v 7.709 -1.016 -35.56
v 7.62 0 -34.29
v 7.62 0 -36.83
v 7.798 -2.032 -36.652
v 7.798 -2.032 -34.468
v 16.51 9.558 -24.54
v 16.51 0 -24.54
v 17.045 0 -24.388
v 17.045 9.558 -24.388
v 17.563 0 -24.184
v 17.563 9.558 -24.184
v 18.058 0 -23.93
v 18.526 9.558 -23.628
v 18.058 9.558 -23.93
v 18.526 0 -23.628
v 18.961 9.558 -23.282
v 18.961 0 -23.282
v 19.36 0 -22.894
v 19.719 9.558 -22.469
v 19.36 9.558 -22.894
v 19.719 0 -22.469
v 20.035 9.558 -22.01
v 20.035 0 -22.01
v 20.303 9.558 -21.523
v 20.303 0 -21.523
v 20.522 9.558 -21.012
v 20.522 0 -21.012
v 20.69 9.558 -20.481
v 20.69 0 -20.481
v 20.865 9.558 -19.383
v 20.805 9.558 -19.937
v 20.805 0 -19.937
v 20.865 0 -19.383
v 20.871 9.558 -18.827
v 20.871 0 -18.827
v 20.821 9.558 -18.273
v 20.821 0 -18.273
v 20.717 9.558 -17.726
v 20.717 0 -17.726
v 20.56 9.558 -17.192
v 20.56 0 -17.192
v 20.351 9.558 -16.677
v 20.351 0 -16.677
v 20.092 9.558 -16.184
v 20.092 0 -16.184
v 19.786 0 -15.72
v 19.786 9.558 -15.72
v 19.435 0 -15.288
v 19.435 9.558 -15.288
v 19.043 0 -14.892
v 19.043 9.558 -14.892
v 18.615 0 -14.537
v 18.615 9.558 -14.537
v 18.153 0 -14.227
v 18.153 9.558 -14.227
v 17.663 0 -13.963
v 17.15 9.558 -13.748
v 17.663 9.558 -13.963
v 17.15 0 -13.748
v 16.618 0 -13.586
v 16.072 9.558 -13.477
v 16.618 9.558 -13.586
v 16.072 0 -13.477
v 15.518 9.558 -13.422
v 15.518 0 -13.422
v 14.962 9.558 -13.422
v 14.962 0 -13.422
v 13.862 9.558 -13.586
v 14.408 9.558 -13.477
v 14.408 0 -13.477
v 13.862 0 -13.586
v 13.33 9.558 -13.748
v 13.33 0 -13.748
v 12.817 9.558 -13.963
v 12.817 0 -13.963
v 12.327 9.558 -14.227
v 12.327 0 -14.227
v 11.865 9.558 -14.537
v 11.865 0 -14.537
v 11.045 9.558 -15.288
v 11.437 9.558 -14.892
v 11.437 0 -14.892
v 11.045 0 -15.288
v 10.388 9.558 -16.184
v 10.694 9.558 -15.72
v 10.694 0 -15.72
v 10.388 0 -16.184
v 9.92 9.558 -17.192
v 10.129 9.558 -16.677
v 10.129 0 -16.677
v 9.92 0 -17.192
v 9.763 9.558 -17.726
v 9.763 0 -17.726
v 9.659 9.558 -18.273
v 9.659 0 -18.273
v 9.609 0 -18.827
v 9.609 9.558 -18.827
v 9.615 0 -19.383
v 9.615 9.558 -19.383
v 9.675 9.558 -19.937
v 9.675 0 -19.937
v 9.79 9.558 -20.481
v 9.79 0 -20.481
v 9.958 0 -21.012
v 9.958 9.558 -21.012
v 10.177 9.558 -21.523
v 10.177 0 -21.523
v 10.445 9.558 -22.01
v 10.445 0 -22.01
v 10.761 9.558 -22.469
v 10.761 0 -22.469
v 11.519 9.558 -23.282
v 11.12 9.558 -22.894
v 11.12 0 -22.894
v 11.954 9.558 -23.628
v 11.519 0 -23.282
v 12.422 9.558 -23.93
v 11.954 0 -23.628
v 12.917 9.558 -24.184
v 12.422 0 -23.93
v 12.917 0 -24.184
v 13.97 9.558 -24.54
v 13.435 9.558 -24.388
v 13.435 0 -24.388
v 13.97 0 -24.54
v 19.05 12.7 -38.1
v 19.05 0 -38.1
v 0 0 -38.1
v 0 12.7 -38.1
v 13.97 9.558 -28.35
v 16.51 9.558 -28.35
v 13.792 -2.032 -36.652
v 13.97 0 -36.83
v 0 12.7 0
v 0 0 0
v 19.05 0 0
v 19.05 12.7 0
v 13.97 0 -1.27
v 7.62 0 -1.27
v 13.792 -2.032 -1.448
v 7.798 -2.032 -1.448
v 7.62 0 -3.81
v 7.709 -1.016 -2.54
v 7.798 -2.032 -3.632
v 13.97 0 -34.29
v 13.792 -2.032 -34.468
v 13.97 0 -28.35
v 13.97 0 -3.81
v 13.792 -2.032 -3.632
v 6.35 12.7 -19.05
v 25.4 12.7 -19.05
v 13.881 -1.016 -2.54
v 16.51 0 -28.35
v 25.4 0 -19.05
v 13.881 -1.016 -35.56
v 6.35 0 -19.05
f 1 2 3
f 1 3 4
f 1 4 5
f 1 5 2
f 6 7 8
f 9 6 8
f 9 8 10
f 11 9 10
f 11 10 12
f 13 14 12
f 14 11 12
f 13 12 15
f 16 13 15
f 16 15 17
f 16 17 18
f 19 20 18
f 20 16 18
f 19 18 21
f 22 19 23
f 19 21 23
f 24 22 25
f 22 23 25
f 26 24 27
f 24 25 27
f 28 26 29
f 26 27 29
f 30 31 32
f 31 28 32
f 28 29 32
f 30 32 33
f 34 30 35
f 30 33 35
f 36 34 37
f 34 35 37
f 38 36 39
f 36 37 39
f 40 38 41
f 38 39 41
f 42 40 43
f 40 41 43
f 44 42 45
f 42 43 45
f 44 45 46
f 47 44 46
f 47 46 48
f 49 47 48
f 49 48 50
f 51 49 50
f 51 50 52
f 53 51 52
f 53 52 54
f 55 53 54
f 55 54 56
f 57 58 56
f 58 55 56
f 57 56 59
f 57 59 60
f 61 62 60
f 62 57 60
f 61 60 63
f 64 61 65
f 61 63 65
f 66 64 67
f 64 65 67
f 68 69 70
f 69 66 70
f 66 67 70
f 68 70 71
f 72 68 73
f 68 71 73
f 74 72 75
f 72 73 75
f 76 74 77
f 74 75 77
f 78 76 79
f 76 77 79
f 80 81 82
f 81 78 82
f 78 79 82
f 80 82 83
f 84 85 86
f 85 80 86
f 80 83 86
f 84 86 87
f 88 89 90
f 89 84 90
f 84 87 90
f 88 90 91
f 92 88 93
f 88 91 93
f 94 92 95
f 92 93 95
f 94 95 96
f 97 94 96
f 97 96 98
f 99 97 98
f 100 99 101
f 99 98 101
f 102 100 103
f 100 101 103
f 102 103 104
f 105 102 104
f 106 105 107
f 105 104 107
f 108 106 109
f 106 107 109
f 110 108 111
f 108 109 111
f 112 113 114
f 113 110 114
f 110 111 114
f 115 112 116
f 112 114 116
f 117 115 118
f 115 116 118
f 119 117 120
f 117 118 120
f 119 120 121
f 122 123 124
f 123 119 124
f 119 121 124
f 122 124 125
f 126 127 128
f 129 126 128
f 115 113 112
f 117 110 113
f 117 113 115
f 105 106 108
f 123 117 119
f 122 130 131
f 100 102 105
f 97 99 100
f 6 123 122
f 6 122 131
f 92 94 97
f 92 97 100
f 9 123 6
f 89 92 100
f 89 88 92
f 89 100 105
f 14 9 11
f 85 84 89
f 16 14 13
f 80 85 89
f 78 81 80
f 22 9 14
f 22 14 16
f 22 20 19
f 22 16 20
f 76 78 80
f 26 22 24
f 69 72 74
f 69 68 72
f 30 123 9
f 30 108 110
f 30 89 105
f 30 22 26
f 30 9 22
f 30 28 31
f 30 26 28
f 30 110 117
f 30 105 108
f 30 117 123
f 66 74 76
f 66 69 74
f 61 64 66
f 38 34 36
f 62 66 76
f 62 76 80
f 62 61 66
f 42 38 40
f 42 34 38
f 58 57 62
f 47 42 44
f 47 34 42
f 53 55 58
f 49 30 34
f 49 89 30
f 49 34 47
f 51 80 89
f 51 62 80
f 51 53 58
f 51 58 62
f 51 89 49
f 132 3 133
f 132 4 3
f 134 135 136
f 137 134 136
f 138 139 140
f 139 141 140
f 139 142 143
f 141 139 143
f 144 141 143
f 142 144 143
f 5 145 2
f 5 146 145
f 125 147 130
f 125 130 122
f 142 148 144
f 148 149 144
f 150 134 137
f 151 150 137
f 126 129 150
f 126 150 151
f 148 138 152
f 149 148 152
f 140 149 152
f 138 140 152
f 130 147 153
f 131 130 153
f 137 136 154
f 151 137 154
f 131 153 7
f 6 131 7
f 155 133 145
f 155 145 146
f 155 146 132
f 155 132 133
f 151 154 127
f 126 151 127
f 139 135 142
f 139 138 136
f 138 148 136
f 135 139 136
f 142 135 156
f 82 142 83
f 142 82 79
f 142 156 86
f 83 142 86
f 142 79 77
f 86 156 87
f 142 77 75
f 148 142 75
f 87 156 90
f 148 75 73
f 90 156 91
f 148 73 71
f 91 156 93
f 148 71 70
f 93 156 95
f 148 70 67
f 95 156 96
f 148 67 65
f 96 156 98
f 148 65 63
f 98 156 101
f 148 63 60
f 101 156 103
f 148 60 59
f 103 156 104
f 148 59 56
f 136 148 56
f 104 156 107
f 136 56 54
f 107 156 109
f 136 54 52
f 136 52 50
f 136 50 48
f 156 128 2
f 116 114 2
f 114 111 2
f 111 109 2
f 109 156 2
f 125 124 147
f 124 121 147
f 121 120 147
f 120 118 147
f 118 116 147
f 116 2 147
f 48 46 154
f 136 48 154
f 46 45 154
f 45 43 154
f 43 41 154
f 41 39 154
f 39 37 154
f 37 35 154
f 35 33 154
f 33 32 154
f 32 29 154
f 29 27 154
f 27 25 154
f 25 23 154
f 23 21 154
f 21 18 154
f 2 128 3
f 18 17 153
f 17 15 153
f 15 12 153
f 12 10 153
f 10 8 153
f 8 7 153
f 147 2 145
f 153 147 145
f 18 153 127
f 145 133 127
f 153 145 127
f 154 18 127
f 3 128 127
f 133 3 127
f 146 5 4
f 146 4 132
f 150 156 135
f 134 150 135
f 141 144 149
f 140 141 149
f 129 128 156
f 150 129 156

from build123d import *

# Parameters (mm, degrees)
BOSS_EXTRUDE1_DEPTH       = 12.7
SKETCH2_R                 = 5.635000033
HAPTIC_MOTOR_CUTOUT_DEPTH = 9.557999934
SKETCH3_W                 = 2.54
SKETCH3_H                 = 3.81
HAPTIC_WIRE_CUTOUT_DEPTH  = 9.557999934
SKETCH4_W                 = 6.35
SKETCH4_H                 = 2.54
PINS_DEPTH                = 2.032
PINS_TAPER                = 5


with BuildPart() as part:
    # Sketch1 → Boss-Extrude1 (new body)
    with BuildSketch(Plane(origin=(0, 0, 0), x_dir=(1, 0, 0), z_dir=(0, 1, 0))):
        Polygon((0, 0), (19.05, 0), (25.4, 19.05), (19.05, 38.1), (0, 38.1), (6.35, 19.05), align=None)
    extrude(amount=BOSS_EXTRUDE1_DEPTH)

    # Sketch2 → Haptic Motor Cutout (cut)
    with BuildSketch(Plane.XZ):
        with Locations((15.24, -19.05)):
            Circle(SKETCH2_R)
    extrude(amount=-HAPTIC_MOTOR_CUTOUT_DEPTH, mode=Mode.SUBTRACT)

    # Sketch3 → Haptic Wire Cutout (cut)
    with BuildSketch(Plane.XZ):
        with Locations((15.24, -26.445020526)):
            Rectangle(SKETCH3_W, SKETCH3_H)
    extrude(amount=-HAPTIC_WIRE_CUTOUT_DEPTH, mode=Mode.SUBTRACT)

    # Sketch4 → Pins (add)
    with BuildSketch(Plane.XZ):
        with Locations((10.795, -35.56)):
            Rectangle(SKETCH4_W, SKETCH4_H)
    pins = extrude(amount=PINS_DEPTH, taper=PINS_TAPER)

    # Mirror1: Pins across plane
    add(pins.mirror(Plane(origin=(0, 0, -19.05), x_dir=(1, 0, 0), z_dir=(0, 0, -1))))


solid = part.part
